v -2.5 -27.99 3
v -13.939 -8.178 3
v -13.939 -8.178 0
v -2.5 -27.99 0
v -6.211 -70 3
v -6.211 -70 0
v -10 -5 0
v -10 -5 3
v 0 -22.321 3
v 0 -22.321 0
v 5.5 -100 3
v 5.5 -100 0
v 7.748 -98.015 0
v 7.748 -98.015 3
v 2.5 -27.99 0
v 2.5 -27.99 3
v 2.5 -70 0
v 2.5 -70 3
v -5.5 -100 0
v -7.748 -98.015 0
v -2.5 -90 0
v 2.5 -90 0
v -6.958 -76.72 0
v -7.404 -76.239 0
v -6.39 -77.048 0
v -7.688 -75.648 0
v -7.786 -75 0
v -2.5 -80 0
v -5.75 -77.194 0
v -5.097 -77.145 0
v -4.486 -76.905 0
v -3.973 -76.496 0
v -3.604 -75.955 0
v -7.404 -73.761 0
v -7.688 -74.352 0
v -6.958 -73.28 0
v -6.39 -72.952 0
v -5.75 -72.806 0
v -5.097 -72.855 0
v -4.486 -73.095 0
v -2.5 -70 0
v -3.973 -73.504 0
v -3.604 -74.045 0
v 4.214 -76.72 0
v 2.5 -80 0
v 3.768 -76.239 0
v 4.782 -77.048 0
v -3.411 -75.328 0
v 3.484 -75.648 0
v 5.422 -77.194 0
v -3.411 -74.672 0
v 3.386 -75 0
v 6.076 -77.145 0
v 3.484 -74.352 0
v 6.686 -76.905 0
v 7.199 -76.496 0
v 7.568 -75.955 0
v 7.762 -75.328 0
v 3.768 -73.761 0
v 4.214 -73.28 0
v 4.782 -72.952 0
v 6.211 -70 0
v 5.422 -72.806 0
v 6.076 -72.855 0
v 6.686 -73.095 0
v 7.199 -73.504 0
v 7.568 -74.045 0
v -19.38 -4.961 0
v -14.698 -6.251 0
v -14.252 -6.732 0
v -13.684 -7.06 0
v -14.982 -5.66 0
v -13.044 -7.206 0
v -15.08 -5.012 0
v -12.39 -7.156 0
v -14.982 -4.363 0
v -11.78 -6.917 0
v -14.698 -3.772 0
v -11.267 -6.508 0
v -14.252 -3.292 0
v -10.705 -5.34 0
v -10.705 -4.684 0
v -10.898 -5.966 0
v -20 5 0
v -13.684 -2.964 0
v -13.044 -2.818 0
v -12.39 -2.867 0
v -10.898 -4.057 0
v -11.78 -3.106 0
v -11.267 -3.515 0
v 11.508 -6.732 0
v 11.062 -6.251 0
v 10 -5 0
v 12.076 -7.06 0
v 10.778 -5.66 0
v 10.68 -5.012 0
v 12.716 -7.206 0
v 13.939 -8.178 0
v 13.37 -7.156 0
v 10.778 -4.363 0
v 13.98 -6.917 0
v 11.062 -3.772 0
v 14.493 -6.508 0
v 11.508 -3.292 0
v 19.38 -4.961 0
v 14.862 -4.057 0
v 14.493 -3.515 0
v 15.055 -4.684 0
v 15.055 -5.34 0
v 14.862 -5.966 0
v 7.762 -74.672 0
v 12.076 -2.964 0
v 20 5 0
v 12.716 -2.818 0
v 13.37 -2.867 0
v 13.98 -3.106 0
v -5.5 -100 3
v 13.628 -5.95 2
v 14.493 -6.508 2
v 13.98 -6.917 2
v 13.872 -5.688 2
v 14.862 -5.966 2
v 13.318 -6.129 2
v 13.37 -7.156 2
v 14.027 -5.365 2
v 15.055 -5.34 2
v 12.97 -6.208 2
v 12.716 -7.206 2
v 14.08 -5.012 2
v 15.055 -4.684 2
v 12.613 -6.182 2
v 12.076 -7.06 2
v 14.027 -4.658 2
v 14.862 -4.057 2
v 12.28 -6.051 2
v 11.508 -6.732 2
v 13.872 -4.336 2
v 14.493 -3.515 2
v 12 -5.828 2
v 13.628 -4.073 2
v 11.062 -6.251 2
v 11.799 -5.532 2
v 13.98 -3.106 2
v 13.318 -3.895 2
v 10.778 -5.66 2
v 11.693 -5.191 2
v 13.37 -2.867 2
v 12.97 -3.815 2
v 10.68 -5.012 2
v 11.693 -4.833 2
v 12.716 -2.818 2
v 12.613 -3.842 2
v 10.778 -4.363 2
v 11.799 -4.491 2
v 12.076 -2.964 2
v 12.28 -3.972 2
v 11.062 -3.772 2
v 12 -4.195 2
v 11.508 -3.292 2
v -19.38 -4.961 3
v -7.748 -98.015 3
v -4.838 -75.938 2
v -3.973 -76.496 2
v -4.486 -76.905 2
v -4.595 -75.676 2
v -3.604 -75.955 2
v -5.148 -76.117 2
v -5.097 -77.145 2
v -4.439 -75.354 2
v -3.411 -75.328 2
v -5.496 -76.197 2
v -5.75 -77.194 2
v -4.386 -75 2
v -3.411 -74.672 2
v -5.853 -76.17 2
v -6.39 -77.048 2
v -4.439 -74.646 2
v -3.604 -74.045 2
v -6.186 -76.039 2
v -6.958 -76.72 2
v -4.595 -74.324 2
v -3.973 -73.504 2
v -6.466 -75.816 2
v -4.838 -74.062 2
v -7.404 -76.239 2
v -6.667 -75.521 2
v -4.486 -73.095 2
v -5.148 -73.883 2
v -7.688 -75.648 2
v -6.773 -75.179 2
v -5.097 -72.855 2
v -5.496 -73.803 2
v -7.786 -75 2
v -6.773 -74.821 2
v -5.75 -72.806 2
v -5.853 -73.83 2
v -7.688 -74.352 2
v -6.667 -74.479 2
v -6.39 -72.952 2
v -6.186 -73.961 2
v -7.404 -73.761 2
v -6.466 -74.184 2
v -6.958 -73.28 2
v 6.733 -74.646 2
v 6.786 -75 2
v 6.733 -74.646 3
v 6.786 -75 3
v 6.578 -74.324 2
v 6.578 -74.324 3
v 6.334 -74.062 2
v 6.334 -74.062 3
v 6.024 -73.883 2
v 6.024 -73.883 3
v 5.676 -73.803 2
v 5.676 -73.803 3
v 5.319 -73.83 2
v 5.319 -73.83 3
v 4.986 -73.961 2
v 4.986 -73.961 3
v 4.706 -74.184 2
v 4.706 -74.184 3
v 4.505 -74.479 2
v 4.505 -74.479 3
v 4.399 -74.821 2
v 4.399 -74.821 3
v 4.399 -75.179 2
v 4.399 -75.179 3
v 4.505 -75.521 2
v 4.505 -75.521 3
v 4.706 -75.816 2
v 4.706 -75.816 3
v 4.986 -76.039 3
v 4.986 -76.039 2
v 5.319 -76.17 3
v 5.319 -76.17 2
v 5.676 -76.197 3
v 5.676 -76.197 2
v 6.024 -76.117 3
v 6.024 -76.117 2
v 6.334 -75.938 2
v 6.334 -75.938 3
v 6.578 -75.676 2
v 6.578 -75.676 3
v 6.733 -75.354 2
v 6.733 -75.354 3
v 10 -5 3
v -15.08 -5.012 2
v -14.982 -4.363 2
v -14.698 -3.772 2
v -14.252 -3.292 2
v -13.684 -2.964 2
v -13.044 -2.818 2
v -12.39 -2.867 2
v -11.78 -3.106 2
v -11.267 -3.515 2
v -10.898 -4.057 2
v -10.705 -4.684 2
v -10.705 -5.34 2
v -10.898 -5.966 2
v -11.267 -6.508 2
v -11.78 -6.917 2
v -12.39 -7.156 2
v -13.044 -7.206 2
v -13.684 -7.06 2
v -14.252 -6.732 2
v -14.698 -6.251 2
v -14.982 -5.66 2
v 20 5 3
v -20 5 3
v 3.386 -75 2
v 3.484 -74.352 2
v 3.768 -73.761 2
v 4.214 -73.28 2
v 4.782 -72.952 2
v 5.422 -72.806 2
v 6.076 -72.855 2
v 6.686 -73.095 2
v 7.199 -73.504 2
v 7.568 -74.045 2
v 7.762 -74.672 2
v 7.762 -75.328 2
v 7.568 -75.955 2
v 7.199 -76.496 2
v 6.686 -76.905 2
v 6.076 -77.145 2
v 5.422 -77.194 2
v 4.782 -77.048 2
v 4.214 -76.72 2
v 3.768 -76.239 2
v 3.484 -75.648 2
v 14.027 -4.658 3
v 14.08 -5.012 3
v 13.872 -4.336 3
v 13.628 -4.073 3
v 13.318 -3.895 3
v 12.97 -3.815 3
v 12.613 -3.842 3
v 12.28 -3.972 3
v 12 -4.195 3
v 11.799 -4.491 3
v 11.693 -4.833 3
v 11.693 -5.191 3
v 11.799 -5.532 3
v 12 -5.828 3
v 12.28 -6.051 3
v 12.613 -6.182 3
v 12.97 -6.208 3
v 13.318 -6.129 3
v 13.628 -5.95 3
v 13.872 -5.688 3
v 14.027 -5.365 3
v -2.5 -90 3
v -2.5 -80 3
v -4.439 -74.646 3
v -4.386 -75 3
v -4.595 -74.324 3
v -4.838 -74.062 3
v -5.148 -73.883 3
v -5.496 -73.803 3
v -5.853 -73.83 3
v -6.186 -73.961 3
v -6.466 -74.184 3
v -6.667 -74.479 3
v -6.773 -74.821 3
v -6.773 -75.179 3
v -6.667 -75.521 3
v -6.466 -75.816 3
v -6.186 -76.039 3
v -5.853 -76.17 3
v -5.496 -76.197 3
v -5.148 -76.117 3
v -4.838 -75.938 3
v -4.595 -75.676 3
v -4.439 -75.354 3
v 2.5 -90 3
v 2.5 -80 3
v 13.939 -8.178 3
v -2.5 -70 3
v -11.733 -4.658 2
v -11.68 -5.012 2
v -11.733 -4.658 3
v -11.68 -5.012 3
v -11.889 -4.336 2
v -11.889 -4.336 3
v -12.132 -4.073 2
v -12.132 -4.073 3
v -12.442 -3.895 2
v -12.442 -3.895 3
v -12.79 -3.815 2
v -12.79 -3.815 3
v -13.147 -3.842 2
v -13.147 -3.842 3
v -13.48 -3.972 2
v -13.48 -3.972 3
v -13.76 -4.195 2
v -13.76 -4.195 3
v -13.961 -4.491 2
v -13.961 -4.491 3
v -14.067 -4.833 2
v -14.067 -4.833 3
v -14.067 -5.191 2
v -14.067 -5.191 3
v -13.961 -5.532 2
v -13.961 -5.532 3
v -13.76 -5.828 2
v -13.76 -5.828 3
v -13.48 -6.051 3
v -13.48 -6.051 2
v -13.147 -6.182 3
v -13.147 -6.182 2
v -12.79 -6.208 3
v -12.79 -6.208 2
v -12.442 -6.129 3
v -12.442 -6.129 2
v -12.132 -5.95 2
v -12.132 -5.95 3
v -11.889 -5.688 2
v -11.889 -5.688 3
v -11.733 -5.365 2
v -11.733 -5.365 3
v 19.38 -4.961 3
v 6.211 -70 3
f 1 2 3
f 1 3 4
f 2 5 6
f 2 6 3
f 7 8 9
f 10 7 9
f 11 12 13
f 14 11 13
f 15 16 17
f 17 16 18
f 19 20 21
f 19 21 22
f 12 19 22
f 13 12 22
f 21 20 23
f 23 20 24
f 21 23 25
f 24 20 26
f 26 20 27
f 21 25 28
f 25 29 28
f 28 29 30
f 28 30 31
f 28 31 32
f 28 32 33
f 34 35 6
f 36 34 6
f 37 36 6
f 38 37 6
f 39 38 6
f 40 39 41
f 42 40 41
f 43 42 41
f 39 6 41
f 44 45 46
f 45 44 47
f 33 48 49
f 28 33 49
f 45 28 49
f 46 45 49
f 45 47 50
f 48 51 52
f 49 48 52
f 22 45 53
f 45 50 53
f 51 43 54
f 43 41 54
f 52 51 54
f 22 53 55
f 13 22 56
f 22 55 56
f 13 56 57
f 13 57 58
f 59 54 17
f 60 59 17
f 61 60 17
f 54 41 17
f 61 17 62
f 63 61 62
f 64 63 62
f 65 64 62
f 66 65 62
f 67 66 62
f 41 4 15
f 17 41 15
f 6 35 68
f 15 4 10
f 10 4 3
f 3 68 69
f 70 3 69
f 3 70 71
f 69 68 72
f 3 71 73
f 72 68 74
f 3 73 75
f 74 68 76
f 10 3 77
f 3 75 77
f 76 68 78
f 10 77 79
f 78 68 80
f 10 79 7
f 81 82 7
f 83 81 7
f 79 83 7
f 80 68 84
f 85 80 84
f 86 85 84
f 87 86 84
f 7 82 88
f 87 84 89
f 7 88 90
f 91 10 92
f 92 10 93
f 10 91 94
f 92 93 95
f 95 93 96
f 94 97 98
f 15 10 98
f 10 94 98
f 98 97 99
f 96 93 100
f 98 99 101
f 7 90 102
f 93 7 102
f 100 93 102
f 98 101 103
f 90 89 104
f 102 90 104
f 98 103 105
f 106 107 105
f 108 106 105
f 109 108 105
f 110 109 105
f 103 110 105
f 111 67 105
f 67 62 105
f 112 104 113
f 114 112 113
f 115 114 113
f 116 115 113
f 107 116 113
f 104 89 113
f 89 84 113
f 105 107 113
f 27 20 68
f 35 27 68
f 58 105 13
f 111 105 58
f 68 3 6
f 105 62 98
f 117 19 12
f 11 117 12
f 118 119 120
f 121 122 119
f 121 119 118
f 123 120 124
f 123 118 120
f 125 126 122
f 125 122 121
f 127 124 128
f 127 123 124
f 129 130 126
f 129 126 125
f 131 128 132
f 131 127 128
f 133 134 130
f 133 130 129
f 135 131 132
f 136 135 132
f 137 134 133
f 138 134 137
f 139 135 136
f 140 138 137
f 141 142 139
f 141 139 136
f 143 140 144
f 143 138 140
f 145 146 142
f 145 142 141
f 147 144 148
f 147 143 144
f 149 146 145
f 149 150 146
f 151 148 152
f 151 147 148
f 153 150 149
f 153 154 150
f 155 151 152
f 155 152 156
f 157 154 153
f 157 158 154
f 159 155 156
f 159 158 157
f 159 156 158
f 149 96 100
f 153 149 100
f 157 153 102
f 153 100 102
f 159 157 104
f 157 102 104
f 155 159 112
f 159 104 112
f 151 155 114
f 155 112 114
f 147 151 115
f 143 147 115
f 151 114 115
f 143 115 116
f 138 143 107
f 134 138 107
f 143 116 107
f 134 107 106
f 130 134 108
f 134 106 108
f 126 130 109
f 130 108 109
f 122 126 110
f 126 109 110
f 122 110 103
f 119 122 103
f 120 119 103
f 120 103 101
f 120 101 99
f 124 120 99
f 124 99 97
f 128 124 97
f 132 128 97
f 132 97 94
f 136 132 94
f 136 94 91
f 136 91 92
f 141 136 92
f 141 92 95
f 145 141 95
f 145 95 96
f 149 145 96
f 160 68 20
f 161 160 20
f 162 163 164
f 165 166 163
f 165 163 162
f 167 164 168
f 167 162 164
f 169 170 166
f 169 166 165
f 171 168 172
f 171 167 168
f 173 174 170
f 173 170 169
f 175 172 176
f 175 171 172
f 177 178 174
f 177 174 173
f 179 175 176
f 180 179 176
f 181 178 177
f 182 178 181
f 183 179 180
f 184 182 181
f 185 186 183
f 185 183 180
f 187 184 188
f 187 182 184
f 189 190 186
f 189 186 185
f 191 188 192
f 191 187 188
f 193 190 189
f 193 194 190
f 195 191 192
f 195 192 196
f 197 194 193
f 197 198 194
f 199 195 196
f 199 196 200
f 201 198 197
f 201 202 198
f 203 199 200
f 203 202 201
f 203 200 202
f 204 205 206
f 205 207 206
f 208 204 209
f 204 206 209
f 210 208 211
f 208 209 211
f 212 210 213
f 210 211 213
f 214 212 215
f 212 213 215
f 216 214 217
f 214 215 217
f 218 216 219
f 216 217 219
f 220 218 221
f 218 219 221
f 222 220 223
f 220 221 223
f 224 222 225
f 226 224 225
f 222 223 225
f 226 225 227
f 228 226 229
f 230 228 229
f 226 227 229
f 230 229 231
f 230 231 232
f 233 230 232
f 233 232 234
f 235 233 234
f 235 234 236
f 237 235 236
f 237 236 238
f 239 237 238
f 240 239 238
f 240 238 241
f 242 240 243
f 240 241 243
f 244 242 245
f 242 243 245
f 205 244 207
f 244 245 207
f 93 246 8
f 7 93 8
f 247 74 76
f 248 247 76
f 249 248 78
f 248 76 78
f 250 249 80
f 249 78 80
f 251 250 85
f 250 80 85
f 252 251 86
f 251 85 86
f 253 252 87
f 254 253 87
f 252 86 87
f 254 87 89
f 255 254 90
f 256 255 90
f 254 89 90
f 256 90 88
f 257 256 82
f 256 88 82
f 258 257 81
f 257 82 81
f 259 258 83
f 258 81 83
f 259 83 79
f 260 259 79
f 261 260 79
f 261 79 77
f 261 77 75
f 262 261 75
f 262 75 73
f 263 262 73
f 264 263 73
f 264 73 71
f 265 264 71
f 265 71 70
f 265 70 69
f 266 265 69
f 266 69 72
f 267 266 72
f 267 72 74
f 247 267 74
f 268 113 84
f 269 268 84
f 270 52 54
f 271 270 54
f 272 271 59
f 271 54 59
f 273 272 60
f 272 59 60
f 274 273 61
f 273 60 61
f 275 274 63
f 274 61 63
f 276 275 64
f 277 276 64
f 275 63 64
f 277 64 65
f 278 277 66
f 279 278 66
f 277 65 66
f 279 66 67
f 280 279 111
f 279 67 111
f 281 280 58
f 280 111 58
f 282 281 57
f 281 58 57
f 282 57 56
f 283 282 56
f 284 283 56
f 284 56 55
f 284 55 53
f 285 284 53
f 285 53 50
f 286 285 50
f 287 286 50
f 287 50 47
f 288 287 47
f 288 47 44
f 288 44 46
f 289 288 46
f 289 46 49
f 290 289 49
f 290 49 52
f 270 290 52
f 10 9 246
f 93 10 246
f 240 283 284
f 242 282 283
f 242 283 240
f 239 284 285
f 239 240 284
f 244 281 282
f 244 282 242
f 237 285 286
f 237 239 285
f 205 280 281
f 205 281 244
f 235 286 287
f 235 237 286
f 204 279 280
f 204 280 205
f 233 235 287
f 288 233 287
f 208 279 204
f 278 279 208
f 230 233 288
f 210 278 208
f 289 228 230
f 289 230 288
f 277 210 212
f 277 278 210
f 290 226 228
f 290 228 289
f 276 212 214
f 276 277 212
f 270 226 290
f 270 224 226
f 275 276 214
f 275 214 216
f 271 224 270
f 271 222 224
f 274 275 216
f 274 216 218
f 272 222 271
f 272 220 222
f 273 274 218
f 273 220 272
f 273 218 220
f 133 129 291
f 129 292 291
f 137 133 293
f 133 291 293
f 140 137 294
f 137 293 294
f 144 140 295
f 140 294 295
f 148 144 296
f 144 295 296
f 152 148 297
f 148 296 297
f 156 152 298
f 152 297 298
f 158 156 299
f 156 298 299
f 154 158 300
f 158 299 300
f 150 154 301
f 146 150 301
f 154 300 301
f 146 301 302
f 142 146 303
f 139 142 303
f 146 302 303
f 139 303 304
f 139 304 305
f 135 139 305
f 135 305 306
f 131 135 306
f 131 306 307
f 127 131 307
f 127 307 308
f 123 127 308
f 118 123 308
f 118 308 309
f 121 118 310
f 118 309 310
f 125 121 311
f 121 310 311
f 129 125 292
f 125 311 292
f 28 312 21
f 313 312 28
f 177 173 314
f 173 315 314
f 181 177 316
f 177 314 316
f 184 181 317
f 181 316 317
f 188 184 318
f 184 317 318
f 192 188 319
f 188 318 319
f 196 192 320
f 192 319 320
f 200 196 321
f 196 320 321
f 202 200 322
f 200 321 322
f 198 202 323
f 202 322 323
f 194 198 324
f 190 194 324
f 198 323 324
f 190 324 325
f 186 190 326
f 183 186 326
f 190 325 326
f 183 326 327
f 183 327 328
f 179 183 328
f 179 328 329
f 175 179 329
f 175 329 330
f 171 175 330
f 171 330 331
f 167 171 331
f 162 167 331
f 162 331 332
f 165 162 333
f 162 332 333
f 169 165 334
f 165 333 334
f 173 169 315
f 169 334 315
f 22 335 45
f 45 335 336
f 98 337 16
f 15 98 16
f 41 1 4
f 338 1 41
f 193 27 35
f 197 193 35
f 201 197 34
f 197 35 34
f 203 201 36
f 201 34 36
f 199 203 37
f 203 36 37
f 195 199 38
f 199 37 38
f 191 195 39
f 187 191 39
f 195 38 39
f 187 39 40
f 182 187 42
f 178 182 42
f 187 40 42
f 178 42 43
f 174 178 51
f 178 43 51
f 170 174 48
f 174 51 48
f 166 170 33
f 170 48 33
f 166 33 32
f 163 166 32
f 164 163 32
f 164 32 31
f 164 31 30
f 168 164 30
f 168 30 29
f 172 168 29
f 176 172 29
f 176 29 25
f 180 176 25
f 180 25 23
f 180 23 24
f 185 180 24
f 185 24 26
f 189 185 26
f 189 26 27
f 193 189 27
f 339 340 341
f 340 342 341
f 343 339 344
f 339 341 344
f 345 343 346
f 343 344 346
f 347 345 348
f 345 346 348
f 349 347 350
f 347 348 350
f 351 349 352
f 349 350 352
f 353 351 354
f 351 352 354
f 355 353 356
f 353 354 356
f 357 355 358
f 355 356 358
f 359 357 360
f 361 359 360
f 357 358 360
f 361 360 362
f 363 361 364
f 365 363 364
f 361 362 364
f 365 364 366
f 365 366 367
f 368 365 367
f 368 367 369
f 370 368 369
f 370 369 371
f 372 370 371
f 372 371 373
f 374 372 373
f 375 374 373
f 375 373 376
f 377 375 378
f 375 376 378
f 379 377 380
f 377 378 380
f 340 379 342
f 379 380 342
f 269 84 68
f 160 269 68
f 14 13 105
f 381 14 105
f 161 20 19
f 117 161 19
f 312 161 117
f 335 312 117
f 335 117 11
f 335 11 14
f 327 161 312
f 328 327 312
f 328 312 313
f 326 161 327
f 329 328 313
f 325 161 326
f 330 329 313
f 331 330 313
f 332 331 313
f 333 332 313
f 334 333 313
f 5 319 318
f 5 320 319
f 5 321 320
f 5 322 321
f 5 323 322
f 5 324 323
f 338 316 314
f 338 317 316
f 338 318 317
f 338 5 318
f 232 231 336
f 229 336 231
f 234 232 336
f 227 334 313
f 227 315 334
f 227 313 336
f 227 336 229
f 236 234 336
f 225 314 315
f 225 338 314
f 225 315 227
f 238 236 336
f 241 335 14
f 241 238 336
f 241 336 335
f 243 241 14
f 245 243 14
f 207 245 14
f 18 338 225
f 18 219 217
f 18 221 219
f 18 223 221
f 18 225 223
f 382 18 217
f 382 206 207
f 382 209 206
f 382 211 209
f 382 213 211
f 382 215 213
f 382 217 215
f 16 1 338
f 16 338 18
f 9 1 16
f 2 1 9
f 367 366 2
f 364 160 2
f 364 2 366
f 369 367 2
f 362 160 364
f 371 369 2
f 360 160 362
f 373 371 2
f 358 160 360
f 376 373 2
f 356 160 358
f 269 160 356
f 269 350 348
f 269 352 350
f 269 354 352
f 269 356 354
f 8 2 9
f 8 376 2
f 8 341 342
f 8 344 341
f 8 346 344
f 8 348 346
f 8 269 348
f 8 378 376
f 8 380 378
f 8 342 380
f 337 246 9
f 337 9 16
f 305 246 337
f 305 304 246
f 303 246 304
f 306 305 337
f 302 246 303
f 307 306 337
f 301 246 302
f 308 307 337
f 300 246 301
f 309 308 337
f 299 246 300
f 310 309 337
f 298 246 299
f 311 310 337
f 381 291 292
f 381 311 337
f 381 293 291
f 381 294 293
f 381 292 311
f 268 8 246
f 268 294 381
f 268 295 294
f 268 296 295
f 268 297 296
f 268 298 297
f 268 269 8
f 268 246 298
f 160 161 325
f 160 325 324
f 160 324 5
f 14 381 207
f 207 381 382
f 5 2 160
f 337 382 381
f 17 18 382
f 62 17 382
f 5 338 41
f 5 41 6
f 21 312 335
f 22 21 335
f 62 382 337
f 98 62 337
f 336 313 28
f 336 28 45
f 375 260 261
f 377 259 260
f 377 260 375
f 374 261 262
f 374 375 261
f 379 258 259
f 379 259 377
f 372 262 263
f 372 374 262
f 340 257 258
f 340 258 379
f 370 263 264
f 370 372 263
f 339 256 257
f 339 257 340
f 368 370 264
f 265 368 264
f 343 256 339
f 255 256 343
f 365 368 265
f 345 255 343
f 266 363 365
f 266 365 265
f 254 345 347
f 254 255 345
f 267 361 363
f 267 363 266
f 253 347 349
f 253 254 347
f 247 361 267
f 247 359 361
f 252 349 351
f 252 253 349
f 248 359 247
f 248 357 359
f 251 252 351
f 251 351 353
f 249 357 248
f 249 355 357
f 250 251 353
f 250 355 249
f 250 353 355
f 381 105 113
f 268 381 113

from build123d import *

# Parameters (mm, degrees)
EXTRUDE_1_DEPTH              = 3
CUT_EXTRUDE_1_REACH          = 104.025
SKETCH_2_W                   = 5
SKETCH_2_H                   = 10
HOLE_WIZARD_M2_1_D           = 2.4
HOLE_WIZARD_M2_1_CBORE_D     = 4.4
HOLE_WIZARD_M2_1_CBORE_DEPTH = 2
CUT_EXTRUDE_2_REACH          = 104.025
SKETCH_5_R                   = 4
HOLE_WIZARD_M2_2_D           = 2.4
HOLE_WIZARD_M2_2_CBORE_D     = 4.4
HOLE_WIZARD_M2_2_CBORE_DEPTH = 2
HOLE_WIZARD_M2_3_D           = 2.4
HOLE_WIZARD_M2_3_CBORE_D     = 4.4
HOLE_WIZARD_M2_3_CBORE_DEPTH = 2
CUT_EXTRUDE_3_DEPTH          = 3
HOLE_WIZARD_M2_5_D           = 2.4
HOLE_WIZARD_M2_5_CBORE_D     = 4.4
HOLE_WIZARD_M2_5_CBORE_DEPTH = 2
HOLE_WIZARD_M2_6_D           = 2.4
HOLE_WIZARD_M2_6_CBORE_D     = 4.4
HOLE_WIZARD_M2_6_CBORE_DEPTH = 2
CUT_EXTRUDE_4_DEPTH          = 10


with BuildPart() as part:
    # 草图1 → 凸台-拉伸1 (new body)
    with BuildSketch(Plane.XY):
        Polygon((20, 5), (20, 45), (19.258297735, 54.944681764), (13.241702265, 95.055318236), (7.5, 100), (-7.5, 100), (-13.241702265, 95.055318236), (-19.258297735, 54.944681764), (-20, 45), (-20, 5), (-19.379826327, -4.961389384), (-7.748069469, -98.015444247), (-5.5, -100), (5.5, -100), (7.748069469, -98.015444247), (19.379826327, -4.961389384), align=None)
    extrude(amount=EXTRUDE_1_DEPTH)

    # 草图2 → 切除-拉伸1 (cut, up to next)
    with BuildSketch(Plane.XY.offset(3), mode=Mode.PRIVATE) as cut_extrude_1_sk1:
        Polygon((10, -5), (-10, -5), (0, -22.320508076), align=None)
    cut_extrude_1_tool1 = extrude(cut_extrude_1_sk1.sketch, amount=-CUT_EXTRUDE_1_REACH, mode=Mode.PRIVATE) & part.part
    # 草图2 → 切除-拉伸1 (cut, up to next)
    with BuildSketch(Plane.XY.offset(3), mode=Mode.PRIVATE) as cut_extrude_1_sk2:
        Polygon((6.211088907, -70), (13.938881842, -8.177656525), (2.5, -27.990381057), (2.5, -70), align=None)
    cut_extrude_1_tool2 = extrude(cut_extrude_1_sk2.sketch, amount=-CUT_EXTRUDE_1_REACH, mode=Mode.PRIVATE) & part.part
    # 草图2 → 切除-拉伸1 (cut, up to next)
    with BuildSketch(Plane.XY.offset(3), mode=Mode.PRIVATE) as cut_extrude_1_sk3:
        Polygon((-13.938881842, -8.177656525), (-2.5, -27.990381057), (-2.5, -70), (-6.211088907, -70), align=None)
    cut_extrude_1_tool3 = extrude(cut_extrude_1_sk3.sketch, amount=-CUT_EXTRUDE_1_REACH, mode=Mode.PRIVATE) & part.part
    # 草图2 → 切除-拉伸1 (cut, up to next)
    with BuildSketch(Plane.XY.offset(3), mode=Mode.PRIVATE) as cut_extrude_1_sk4:
        with Locations((0, -85)):
            Rectangle(SKETCH_2_W, SKETCH_2_H)
    cut_extrude_1_tool4 = extrude(cut_extrude_1_sk4.sketch, amount=-CUT_EXTRUDE_1_REACH, mode=Mode.PRIVATE) & part.part
    add(cut_extrude_1_tool1.solids().sort_by_distance((0, -10.773503, 3))[0], mode=Mode.SUBTRACT)
    add(cut_extrude_1_tool2.solids().sort_by_distance((6.712708, -39.914502, 3))[0], mode=Mode.SUBTRACT)
    add(cut_extrude_1_tool3.solids().sort_by_distance((-6.712708, -39.914502, 3))[0], mode=Mode.SUBTRACT)
    add(cut_extrude_1_tool4.solids().sort_by_distance((0, -85, 3))[0], mode=Mode.SUBTRACT)

    # M2 凹头盖螺钉的柱形沉头孔1 (through all)
    with Locations(Plane(origin=(5.586088907, -75, 0), x_dir=(-1, 0, 0), z_dir=(0, 0, -1))):
        with Locations((0, 0), (11.172177814, 0)):
            CounterBoreHole(HOLE_WIZARD_M2_1_D / 2, HOLE_WIZARD_M2_1_CBORE_D / 2, HOLE_WIZARD_M2_1_CBORE_DEPTH)

    # 草图5 → 切除-拉伸2 (cut, up to next)
    with BuildSketch(Plane(origin=(0, 0, 0), x_dir=(-1, 0, 0), z_dir=(0, 0, -1)), mode=Mode.PRIVATE) as cut_extrude_2_sk1:
        with Locations((0, 25)):
            Circle(SKETCH_5_R)
    cut_extrude_2_tool1 = extrude(cut_extrude_2_sk1.sketch, amount=-CUT_EXTRUDE_2_REACH, mode=Mode.PRIVATE) & part.part
    add(cut_extrude_2_tool1.solids().sort_by_distance((0, 25, 0))[0], mode=Mode.SUBTRACT)

    # M2 凹头盖螺钉的柱形沉头孔2 (through all)
    with Locations(Plane(origin=(8, 25, 0), x_dir=(-1, 0, 0), z_dir=(0, 0, -1))):
        with Locations((0, 0), (8, 8), (16, 0), (8, -8)):
            CounterBoreHole(HOLE_WIZARD_M2_2_D / 2, HOLE_WIZARD_M2_2_CBORE_D / 2, HOLE_WIZARD_M2_2_CBORE_DEPTH)

    # M2 凹头盖螺钉的柱形沉头孔3 (through all)
    with Locations(Plane(origin=(12.880020708, -5.011657807, 0), x_dir=(-1, 0, 0), z_dir=(0, 0, -1))):
        with Locations((0, 0), (25.760041416, 0)):
            CounterBoreHole(HOLE_WIZARD_M2_3_D / 2, HOLE_WIZARD_M2_3_CBORE_D / 2, HOLE_WIZARD_M2_3_CBORE_DEPTH)

    # 草图10 → 切除-拉伸3 (cut)
    with BuildSketch(Plane(origin=(0, 0, 0), x_dir=(-1, 0, 0), z_dir=(0, 0, -1))):
        Polygon((-14.016935065, 56.180852205), (-10.679274874, 78.431920145), (-8.411945476, 80.068406675), (-4.470648492, 79.385634325), (-2.5, 77.04424815), (-2.5, 56.2029795), (-4.5, 54.2029795), (-12.313615971, 54.2029795), align=None)
        Polygon((-9.344020618, 87.333615184), (-8.2970205, 94.313615971), (0, 94.313615971), (8.2970205, 94.313615971), (9.344020618, 87.333615184), (7.670053032, 85.014356303), (0, 83.685631227), (-7.670053032, 85.014356303), align=None)
        Polygon((4.5, 54.2029795), (12.313615971, 54.2029795), (14.016935065, 56.180852205), (10.679274874, 78.431920145), (8.411945476, 80.068406675), (4.470648492, 79.385634325), (2.5, 77.04424815), (2.5, 56.2029795), align=None)
    extrude(amount=-CUT_EXTRUDE_3_DEPTH, mode=Mode.SUBTRACT)

    # M2 凹头盖螺钉的柱形沉头孔5 (through all)
    with Locations(Plane(origin=(0, 79.840052868, 0), x_dir=(-1, 0, 0), z_dir=(0, 0, -1))):
        with Locations((0, 0)):
            CounterBoreHole(HOLE_WIZARD_M2_5_D / 2, HOLE_WIZARD_M2_5_CBORE_D / 2, HOLE_WIZARD_M2_5_CBORE_DEPTH)

    # M2 凹头盖螺钉的柱形沉头孔6 (through all)
    with Locations(Plane(origin=(12.880020708, 14.988342193, 0), x_dir=(-1, 0, 0), z_dir=(0, 0, -1))):
        with Locations((0, 0), (25.760041416, 0)):
            CounterBoreHole(HOLE_WIZARD_M2_6_D / 2, HOLE_WIZARD_M2_6_CBORE_D / 2, HOLE_WIZARD_M2_6_CBORE_DEPTH)

    # 草图17 → 切除-拉伸4 (cut)
    with BuildSketch(Plane(origin=(0, 0, 0), x_dir=(-1, 0, 0), z_dir=(0, 0, -1))):
        Polygon((-20, 5), (20, 5), (20, 99.998273705), (7.5, 100), (-7.5, 100), (-20, 99.998273705), align=None)
    extrude(amount=-CUT_EXTRUDE_4_DEPTH, mode=Mode.SUBTRACT)


solid = part.part
